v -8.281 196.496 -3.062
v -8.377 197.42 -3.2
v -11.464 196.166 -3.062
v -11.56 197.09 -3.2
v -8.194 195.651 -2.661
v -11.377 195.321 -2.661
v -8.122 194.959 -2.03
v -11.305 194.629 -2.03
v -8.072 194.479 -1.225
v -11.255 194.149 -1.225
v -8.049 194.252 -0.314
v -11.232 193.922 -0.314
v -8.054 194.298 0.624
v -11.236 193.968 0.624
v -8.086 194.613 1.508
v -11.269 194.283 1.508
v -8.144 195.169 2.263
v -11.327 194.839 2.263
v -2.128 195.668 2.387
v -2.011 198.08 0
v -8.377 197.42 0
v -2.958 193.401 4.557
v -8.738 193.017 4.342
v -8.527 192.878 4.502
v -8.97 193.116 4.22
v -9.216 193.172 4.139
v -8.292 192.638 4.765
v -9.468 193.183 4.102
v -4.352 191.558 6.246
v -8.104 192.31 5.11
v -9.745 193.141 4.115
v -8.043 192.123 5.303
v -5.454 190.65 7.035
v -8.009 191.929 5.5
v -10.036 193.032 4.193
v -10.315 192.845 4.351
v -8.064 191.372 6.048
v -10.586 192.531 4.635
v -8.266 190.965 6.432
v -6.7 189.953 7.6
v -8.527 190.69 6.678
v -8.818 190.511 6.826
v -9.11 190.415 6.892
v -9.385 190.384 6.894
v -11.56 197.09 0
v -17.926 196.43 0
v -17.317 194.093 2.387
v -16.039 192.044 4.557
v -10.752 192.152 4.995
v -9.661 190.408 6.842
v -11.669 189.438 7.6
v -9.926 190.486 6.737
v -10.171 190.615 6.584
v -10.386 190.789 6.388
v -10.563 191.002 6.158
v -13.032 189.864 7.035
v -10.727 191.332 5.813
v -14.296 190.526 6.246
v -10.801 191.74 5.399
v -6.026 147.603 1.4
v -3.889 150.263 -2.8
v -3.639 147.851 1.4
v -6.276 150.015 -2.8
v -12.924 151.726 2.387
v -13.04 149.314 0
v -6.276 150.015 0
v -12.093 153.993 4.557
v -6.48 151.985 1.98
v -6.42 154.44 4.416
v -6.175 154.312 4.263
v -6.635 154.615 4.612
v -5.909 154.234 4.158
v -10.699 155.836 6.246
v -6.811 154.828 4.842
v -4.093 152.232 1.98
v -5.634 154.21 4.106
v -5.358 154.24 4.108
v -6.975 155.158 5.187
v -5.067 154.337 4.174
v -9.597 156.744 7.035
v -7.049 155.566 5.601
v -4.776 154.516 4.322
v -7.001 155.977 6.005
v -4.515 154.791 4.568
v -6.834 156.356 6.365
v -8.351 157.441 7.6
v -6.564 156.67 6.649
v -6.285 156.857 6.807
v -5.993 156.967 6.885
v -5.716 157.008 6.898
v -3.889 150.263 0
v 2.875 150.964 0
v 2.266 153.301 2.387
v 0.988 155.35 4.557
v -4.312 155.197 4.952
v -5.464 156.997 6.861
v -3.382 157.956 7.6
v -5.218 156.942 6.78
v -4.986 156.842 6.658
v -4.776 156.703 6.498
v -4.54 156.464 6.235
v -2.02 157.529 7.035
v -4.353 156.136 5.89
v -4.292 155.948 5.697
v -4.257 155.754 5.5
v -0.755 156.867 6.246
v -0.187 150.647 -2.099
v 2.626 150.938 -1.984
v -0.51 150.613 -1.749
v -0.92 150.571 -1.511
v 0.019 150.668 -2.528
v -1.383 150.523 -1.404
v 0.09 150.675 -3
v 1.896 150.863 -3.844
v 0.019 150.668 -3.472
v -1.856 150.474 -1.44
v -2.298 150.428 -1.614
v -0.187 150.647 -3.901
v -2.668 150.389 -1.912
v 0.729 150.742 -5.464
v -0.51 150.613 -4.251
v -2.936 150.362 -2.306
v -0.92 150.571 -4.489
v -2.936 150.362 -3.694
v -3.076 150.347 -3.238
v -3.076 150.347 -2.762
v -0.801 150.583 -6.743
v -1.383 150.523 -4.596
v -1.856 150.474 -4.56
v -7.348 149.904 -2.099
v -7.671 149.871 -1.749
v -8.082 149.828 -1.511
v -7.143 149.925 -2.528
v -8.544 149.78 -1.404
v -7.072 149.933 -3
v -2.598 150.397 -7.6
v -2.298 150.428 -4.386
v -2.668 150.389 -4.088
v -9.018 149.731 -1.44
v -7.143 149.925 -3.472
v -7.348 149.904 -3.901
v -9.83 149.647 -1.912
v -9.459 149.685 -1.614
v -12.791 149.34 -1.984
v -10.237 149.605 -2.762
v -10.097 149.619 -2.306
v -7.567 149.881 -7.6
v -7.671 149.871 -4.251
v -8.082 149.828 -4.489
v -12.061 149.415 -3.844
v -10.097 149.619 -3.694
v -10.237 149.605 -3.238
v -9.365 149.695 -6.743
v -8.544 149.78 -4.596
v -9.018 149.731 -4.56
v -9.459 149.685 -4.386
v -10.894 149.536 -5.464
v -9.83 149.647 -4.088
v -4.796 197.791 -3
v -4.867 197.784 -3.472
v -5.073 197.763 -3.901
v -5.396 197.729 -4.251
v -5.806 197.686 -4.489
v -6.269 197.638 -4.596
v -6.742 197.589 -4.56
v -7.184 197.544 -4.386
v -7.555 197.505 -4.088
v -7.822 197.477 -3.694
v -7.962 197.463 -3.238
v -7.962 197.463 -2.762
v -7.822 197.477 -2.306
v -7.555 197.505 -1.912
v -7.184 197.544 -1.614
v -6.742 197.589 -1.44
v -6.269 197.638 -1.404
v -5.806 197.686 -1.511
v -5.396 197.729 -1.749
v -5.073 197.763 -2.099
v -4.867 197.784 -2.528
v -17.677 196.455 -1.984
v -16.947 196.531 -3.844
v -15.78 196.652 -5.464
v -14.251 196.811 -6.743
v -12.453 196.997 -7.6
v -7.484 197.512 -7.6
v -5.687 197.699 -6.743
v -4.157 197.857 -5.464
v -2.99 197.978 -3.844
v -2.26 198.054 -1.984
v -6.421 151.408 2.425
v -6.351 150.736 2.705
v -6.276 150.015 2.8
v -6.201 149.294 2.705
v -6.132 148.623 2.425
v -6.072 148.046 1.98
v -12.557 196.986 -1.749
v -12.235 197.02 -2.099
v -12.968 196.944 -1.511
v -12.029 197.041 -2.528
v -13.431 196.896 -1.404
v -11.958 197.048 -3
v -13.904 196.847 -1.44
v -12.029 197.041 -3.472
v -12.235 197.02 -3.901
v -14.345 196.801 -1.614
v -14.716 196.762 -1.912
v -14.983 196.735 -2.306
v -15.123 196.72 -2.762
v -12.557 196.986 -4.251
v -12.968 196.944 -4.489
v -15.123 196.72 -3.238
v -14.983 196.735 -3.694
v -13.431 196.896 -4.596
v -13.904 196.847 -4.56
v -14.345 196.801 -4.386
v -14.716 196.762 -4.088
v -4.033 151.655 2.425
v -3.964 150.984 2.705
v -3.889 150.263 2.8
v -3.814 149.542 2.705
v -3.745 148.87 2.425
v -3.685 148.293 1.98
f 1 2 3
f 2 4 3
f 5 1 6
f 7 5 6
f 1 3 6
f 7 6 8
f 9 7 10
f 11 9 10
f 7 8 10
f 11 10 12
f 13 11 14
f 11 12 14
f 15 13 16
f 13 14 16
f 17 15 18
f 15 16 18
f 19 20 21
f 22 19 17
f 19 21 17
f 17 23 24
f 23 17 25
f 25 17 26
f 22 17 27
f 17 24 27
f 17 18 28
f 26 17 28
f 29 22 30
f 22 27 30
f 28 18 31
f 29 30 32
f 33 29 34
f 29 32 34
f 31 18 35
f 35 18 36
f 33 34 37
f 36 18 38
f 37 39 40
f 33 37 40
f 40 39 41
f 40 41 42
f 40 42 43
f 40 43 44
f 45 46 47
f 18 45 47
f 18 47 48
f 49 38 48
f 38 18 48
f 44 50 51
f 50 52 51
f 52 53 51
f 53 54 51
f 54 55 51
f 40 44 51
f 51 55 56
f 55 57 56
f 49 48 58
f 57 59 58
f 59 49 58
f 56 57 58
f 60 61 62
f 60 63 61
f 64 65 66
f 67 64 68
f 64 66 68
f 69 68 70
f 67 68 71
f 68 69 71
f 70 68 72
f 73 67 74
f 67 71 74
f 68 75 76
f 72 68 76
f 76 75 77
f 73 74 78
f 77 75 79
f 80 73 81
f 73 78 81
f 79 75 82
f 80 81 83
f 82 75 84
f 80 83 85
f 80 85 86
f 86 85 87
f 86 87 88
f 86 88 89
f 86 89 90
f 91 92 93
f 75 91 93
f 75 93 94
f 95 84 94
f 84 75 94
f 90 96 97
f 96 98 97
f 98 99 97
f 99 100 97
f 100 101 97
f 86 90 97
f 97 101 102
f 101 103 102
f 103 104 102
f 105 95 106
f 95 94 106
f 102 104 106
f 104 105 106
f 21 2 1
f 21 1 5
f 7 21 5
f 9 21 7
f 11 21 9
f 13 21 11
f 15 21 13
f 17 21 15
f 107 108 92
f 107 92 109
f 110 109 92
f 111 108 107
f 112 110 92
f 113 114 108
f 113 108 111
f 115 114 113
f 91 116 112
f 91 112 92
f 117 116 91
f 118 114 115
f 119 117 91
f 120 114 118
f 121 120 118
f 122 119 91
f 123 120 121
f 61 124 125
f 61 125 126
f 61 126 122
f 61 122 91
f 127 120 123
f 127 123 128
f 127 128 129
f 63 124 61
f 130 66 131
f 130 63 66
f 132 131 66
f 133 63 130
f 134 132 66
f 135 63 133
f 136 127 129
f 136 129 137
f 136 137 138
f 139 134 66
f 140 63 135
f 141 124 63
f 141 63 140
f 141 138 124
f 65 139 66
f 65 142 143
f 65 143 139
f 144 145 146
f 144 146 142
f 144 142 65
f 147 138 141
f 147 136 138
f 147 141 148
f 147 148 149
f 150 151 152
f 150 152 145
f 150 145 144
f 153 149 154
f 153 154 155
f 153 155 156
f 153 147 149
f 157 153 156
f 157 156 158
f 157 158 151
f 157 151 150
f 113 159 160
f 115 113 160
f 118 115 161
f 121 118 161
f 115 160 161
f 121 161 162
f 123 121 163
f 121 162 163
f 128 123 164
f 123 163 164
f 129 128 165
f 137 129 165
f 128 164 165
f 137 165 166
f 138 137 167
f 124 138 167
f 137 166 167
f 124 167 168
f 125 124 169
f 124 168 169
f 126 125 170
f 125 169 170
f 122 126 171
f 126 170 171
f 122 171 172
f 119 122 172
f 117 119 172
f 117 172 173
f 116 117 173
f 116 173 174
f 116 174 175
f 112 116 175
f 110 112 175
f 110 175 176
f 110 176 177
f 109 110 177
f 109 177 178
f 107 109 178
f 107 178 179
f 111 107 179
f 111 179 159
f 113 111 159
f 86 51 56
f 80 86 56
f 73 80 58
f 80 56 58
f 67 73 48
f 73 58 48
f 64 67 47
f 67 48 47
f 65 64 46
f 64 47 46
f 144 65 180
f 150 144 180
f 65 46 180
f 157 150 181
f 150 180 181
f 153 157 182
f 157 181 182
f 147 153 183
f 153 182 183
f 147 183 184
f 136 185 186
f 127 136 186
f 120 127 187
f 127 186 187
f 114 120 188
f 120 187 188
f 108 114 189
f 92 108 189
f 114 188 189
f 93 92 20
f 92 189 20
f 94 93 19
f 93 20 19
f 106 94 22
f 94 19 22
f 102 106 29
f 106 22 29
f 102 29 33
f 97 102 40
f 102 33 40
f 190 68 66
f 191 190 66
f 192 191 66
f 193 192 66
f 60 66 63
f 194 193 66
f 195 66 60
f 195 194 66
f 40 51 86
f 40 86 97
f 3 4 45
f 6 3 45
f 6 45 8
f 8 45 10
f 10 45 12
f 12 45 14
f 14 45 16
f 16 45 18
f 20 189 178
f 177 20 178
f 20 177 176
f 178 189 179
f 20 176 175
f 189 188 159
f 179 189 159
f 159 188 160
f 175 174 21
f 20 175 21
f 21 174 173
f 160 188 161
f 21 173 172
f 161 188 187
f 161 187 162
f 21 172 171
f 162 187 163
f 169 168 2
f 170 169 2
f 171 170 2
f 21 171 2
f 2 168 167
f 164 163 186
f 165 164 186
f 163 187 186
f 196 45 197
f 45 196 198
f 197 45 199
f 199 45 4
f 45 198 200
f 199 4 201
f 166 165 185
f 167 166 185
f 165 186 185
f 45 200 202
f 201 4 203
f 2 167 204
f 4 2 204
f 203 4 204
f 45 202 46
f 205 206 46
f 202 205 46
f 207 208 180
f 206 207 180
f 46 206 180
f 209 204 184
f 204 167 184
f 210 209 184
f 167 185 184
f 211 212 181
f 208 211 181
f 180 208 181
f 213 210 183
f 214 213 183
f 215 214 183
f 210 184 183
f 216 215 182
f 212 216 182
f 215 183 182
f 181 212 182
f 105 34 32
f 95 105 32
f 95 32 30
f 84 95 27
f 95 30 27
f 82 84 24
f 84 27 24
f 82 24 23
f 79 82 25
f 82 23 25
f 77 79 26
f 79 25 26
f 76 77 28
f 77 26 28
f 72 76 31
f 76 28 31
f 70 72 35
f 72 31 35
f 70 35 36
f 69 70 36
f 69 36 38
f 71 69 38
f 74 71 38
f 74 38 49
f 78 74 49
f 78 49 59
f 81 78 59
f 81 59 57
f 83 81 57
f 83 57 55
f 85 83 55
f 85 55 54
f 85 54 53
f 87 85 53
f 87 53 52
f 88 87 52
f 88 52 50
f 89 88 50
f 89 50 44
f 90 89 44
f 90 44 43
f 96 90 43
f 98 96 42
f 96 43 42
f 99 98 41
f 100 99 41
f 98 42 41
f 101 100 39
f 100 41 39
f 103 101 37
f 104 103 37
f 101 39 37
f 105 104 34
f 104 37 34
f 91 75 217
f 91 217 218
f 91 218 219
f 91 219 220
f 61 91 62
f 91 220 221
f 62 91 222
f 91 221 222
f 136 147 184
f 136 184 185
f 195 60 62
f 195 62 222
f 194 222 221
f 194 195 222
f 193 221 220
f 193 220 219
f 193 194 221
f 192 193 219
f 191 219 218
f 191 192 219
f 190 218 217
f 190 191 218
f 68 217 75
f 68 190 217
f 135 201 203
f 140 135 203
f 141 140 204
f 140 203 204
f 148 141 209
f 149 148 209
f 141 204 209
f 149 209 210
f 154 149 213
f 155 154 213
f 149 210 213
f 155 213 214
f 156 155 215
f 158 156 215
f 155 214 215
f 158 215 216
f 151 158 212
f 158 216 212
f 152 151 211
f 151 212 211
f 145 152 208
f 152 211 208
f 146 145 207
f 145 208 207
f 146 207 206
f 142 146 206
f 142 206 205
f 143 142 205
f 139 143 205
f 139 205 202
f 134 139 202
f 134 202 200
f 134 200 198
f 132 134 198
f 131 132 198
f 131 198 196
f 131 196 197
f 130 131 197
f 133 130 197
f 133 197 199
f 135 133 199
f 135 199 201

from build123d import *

# Parameters (mm, degrees)
SKETCH3_R               = 8
BOSS_EXTRUDE1_DEPTH     = 47.368421053
CUT_EXTRUDE1_DEPTH      = 13.860013886
CUT_EXTRUDE1_DEPTH_BACK = 13.860013886
BOSS_EXTRUDE2_DEPTH     = 1.2
CUT_EXTRUDE2_DEPTH      = 1.6
SKETCH8_R               = 1.4
SKETCH8_R_2             = 1.6
CUT_EXTRUDE3_DEPTH      = 2.64160469
CUT_EXTRUDE3_DEPTH_BACK = 51.711414178
CUT_EXTRUDE4_DEPTH      = 51.711414178


with BuildPart() as part:
    # Sketch3 → Boss-Extrude1 (new body)
    with BuildSketch(Plane(origin=(-20.344467381, 196.178792599, 0), x_dir=(-0.994665758, -0.103150523, 0), z_dir=(0.103150523, -0.994665758, 0))):
        with Locations((-10.431405186, 0)):
            Circle(SKETCH3_R)
    extrude(amount=BOSS_EXTRUDE1_DEPTH)

    # Sketch4 → Cut-Extrude1 (cut, two sides)
    with BuildSketch(Plane(origin=(10.375761543, 1.076004901, 0), x_dir=(0.103150523, -0.994665758, 0), z_dir=(-0.994665758, -0.103150523, 0))) as cut_extrude1_sk:
        Polygon((-197.230869842, 0), (-189.230869842, 8), (-197.230869842, 8), align=None)
        Polygon((-157.862448789, 8), (-149.862448789, 8), (-149.862448789, 0), align=None)
    extrude(amount=CUT_EXTRUDE1_DEPTH, mode=Mode.SUBTRACT)
    extrude(cut_extrude1_sk.sketch, amount=-CUT_EXTRUDE1_DEPTH_BACK, mode=Mode.SUBTRACT)

    # Sketch5 → Boss-Extrude2 (add, symmetric)
    with BuildSketch(Plane(origin=(10.375761543, 1.076004901, 0), x_dir=(0.103150523, -0.994665758, 0), z_dir=(-0.994665758, -0.103150523, 0))):
        with BuildLine():
            Line((-149.862448789, -2.8), (-147.437577659, 1.4))
            ThreePointArc((-147.437577659, 1.4), (-149.496975451, 2.776045612), (-151.842347777, 1.979898987))
            Line((-151.842347777, 1.979898987), (-149.862448789, 0))
            Line((-149.862448789, 0), (-149.862448789, -2.8))
        make_face()
    extrude(amount=BOSS_EXTRUDE2_DEPTH, both=True)

    # Sketch7 → Cut-Extrude2 (cut, symmetric)
    with BuildSketch(Plane(origin=(10.375761543, 1.076004901, 0), x_dir=(0.103150523, -0.994665758, 0), z_dir=(-0.994665758, -0.103150523, 0))):
        with BuildLine():
            Line((-194.968128142, 2.2627417), (-197.230869842, 0))
            Line((-197.230869842, 0), (-197.230869842, -3.2))
            ThreePointArc((-197.230869842, -3.2), (-194.274455338, -1.224586984), (-194.968128142, 2.2627417))
        make_face()
    extrude(amount=CUT_EXTRUDE2_DEPTH, both=True, mode=Mode.SUBTRACT)

    # Sketch8 → Cut-Extrude3 (cut, two sides)
    with BuildSketch(Plane(origin=(-20.344467381, 196.178792599, 0), x_dir=(0.994665758, 0.103150523, 0), z_dir=(-0.103150523, 0.994665758, 0))) as cut_extrude3_sk:
        with Locations((10.431405186, -5.5)):
            Circle(SKETCH8_R)
        with Locations((6.831405186, 3)):
            Circle(SKETCH8_R_2)
        with Locations((14.031405186, 3)):
            Circle(SKETCH8_R_2)
    extrude(amount=CUT_EXTRUDE3_DEPTH, mode=Mode.SUBTRACT)
    extrude(cut_extrude3_sk.sketch, amount=-CUT_EXTRUDE3_DEPTH_BACK, mode=Mode.SUBTRACT)

    # Sketch9 → Cut-Extrude4 (cut, through all)
    with BuildSketch(Plane(origin=(-20.344467381, 196.178792599, 0), x_dir=(0.994665758, 0.103150523, 0), z_dir=(-0.103150523, 0.994665758, 0))):
        with BuildLine():
            Line((7.933405986, 7.6), (12.929404385, 7.6))
            ThreePointArc((12.929404385, 7.6), (10.431405186, 8), (7.933405986, 7.6))
        make_face()
        with BuildLine():
            Line((7.933405986, -7.6), (12.929404385, -7.6))
            ThreePointArc((12.929404385, -7.6), (10.431405186, -8), (7.933405986, -7.6))
        make_face()
    extrude(amount=-CUT_EXTRUDE4_DEPTH, mode=Mode.SUBTRACT)


solid = part.part
